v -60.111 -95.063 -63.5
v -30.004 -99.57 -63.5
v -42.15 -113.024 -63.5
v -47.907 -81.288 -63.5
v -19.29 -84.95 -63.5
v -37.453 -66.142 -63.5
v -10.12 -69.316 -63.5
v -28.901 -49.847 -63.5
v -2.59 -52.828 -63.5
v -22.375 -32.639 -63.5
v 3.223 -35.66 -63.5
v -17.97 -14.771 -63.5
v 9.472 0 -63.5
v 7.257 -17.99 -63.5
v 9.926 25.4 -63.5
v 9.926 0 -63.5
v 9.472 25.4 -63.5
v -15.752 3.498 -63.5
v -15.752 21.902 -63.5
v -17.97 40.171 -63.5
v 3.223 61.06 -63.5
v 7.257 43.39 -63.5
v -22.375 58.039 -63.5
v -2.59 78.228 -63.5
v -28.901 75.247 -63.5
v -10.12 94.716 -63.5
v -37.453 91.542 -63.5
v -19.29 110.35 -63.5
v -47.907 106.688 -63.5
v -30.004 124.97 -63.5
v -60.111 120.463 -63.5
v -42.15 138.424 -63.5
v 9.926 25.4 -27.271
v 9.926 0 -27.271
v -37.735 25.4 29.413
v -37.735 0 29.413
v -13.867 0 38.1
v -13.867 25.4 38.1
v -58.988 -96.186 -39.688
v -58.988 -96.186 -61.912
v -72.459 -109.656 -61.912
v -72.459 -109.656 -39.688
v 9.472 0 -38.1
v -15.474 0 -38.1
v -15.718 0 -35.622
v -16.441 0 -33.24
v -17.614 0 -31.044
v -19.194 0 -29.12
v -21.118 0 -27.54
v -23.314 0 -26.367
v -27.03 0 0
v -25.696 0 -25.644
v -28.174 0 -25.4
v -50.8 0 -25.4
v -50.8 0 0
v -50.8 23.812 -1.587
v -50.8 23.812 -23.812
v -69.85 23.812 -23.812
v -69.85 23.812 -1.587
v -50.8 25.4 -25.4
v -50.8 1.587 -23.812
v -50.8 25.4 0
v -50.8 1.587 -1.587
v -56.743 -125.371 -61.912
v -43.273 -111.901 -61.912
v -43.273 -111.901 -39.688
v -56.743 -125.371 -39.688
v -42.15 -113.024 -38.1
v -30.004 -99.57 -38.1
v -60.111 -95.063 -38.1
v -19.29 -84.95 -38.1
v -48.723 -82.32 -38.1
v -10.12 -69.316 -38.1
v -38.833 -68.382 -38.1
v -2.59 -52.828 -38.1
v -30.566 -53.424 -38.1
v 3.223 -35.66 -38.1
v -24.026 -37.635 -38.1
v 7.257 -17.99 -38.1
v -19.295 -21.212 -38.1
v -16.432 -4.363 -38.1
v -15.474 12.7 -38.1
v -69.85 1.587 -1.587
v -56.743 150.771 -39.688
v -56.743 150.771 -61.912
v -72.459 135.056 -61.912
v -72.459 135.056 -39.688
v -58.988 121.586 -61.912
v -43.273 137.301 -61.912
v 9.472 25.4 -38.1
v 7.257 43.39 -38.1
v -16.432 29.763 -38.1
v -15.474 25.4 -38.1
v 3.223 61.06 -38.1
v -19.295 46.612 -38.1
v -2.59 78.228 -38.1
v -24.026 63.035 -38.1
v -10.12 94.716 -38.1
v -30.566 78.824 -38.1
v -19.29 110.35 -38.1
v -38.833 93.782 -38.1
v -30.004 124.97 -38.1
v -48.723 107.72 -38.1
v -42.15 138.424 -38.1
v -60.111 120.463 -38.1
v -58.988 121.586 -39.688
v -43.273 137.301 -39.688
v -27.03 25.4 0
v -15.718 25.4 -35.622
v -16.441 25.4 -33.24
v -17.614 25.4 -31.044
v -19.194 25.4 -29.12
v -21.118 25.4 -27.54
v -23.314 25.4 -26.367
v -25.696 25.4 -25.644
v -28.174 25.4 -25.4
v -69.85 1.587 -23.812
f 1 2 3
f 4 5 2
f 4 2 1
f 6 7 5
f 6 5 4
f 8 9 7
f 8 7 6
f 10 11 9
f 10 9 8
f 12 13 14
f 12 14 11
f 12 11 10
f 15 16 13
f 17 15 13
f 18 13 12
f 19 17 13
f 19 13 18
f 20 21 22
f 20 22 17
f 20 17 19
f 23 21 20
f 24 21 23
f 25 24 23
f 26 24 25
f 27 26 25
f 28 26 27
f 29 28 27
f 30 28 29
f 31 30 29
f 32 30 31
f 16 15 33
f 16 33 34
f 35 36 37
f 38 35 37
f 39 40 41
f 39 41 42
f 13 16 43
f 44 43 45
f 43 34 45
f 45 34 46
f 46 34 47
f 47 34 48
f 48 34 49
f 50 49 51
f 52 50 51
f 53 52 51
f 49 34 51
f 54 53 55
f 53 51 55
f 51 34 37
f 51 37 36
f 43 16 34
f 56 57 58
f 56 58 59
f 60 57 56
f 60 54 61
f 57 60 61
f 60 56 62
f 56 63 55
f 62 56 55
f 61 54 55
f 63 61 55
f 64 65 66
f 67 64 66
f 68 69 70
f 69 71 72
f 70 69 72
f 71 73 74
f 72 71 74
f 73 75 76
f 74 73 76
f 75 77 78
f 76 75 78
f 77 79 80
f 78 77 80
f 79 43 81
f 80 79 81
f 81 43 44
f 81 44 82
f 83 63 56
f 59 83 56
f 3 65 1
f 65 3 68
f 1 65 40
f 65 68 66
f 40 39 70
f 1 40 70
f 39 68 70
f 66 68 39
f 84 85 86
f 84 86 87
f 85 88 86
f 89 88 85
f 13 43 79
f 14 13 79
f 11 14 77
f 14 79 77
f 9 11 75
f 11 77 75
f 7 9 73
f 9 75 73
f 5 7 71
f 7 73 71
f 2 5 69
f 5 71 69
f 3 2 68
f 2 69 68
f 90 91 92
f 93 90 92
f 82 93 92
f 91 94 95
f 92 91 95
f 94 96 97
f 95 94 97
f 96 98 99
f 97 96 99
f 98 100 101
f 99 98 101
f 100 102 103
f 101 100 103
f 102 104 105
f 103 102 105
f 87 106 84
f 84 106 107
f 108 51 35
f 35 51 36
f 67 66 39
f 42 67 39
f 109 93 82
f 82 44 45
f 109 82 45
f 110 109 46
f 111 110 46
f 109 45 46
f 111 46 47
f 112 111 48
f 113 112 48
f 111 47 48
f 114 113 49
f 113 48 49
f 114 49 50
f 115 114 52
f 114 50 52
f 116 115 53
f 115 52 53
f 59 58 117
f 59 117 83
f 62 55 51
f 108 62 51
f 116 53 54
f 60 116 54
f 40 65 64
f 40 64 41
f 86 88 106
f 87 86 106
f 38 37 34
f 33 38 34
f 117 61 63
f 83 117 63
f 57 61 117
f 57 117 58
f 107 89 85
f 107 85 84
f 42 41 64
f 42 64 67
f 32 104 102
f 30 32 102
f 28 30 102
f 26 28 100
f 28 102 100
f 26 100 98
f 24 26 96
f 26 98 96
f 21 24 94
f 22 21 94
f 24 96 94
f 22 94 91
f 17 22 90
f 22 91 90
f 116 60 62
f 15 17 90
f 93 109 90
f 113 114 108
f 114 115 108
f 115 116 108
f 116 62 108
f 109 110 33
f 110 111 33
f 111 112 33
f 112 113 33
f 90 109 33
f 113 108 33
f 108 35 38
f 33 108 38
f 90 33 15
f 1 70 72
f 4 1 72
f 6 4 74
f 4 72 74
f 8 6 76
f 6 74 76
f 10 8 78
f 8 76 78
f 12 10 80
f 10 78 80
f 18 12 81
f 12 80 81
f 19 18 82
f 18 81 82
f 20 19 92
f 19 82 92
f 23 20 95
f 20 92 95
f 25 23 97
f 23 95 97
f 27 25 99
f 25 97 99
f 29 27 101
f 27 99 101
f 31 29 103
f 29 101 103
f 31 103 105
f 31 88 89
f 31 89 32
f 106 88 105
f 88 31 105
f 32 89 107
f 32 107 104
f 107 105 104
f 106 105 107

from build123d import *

# Parameters (mm, degrees)
BOSS_EXTRUDE1_DEPTH  = 25.4
BOSS_EXTRUDE7_DEPTH  = 25.4
SKETCH5_W            = 22.225
SKETCH5_H            = 22.225
BOSS_EXTRUDE10_DEPTH = 19.05
SKETCH6_W            = 22.225
SKETCH6_H            = 22.225
BOSS_EXTRUDE11_DEPTH = 19.05
SKETCH7_W            = 22.225
SKETCH7_H            = 22.225
BOSS_EXTRUDE13_DEPTH = 19.05


with BuildPart() as part:
    # Sketch1 → Boss-Extrude1 (new body)
    with BuildSketch(Plane(origin=(0, 0, 0), x_dir=(1, 0, 0), z_dir=(0, 1, 0))):
        with BuildLine():
            Line((-50.8, 0), (-27.030115421, 0))
            Line((-27.030115421, 0), (-37.735458494, -29.41268836))
            Line((-37.735458494, -29.41268836), (-13.867265926, -38.1))
            Line((-13.867265926, -38.1), (9.925939517, 27.27129469))
            Line((9.925939517, 27.27129469), (9.925939517, 38.1))
            Line((9.925939517, 38.1), (-15.474060483, 38.1))
            ThreePointArc((-15.474060483, 38.1), (-19.193804362, 29.119743879), (-28.174060483, 25.4))
            Line((-28.174060483, 25.4), (-50.8, 25.4))
            Line((-50.8, 25.4), (-50.8, 0))
        make_face()
    extrude(amount=BOSS_EXTRUDE1_DEPTH)

    # Sketch4 → Boss-Extrude7 (add)
    with BuildSketch(Plane(origin=(0, 0, -38.1), x_dir=(-1, 0, 0), z_dir=(0, 0, -1))):
        with BuildLine():
            Line((-9.925939517, 25.4), (-9.925939517, 0))
            Line((-9.925939517, 0), (-9.471788073, 0))
            ThreePointArc((-9.471788073, 0), (6.144801457, -61.168036219), (42.150474788, -113.023585695))
            Line((42.150474788, -113.023585695), (60.11098703, -95.063073453))
            ThreePointArc((60.11098703, -95.063073453), (15.474060483, 12.7), (60.11098703, 120.463073453))
            Line((60.11098703, 120.463073453), (42.150474788, 138.423585695))
            ThreePointArc((42.150474788, 138.423585695), (6.144801457, 86.568036219), (-9.471788073, 25.4))
            Line((-9.471788073, 25.4), (-9.925939517, 25.4))
        make_face()
    extrude(amount=BOSS_EXTRUDE7_DEPTH)

    # Sketch5 → Boss-Extrude10 (add)
    with BuildSketch(Plane(origin=(-90.287030241, 90.287030241, 0), x_dir=(0, 0, 1), z_dir=(-0.7071067811865479, 0.7071067811865472, 0))):
        with Locations((-50.8, 55.375369568)):
            Rectangle(SKETCH5_W, SKETCH5_H)
    extrude(amount=BOSS_EXTRUDE10_DEPTH)

    # Sketch6 → Boss-Extrude11 (add)
    with BuildSketch(Plane(origin=(-77.587030241, -77.587030241, 0), x_dir=(0, 0, 1), z_dir=(-0.7071067811865478, -0.7071067811865472, 0))):
        with Locations((-50.8, -37.414857326)):
            Rectangle(SKETCH6_W, SKETCH6_H)
    extrude(amount=BOSS_EXTRUDE11_DEPTH)

    # Sketch7 → Boss-Extrude13 (add)
    with BuildSketch(Plane.ZY.offset(50.8)):
        with Locations((-12.7, 12.7)):
            Rectangle(SKETCH7_W, SKETCH7_H)
    extrude(amount=BOSS_EXTRUDE13_DEPTH)


solid = part.part
